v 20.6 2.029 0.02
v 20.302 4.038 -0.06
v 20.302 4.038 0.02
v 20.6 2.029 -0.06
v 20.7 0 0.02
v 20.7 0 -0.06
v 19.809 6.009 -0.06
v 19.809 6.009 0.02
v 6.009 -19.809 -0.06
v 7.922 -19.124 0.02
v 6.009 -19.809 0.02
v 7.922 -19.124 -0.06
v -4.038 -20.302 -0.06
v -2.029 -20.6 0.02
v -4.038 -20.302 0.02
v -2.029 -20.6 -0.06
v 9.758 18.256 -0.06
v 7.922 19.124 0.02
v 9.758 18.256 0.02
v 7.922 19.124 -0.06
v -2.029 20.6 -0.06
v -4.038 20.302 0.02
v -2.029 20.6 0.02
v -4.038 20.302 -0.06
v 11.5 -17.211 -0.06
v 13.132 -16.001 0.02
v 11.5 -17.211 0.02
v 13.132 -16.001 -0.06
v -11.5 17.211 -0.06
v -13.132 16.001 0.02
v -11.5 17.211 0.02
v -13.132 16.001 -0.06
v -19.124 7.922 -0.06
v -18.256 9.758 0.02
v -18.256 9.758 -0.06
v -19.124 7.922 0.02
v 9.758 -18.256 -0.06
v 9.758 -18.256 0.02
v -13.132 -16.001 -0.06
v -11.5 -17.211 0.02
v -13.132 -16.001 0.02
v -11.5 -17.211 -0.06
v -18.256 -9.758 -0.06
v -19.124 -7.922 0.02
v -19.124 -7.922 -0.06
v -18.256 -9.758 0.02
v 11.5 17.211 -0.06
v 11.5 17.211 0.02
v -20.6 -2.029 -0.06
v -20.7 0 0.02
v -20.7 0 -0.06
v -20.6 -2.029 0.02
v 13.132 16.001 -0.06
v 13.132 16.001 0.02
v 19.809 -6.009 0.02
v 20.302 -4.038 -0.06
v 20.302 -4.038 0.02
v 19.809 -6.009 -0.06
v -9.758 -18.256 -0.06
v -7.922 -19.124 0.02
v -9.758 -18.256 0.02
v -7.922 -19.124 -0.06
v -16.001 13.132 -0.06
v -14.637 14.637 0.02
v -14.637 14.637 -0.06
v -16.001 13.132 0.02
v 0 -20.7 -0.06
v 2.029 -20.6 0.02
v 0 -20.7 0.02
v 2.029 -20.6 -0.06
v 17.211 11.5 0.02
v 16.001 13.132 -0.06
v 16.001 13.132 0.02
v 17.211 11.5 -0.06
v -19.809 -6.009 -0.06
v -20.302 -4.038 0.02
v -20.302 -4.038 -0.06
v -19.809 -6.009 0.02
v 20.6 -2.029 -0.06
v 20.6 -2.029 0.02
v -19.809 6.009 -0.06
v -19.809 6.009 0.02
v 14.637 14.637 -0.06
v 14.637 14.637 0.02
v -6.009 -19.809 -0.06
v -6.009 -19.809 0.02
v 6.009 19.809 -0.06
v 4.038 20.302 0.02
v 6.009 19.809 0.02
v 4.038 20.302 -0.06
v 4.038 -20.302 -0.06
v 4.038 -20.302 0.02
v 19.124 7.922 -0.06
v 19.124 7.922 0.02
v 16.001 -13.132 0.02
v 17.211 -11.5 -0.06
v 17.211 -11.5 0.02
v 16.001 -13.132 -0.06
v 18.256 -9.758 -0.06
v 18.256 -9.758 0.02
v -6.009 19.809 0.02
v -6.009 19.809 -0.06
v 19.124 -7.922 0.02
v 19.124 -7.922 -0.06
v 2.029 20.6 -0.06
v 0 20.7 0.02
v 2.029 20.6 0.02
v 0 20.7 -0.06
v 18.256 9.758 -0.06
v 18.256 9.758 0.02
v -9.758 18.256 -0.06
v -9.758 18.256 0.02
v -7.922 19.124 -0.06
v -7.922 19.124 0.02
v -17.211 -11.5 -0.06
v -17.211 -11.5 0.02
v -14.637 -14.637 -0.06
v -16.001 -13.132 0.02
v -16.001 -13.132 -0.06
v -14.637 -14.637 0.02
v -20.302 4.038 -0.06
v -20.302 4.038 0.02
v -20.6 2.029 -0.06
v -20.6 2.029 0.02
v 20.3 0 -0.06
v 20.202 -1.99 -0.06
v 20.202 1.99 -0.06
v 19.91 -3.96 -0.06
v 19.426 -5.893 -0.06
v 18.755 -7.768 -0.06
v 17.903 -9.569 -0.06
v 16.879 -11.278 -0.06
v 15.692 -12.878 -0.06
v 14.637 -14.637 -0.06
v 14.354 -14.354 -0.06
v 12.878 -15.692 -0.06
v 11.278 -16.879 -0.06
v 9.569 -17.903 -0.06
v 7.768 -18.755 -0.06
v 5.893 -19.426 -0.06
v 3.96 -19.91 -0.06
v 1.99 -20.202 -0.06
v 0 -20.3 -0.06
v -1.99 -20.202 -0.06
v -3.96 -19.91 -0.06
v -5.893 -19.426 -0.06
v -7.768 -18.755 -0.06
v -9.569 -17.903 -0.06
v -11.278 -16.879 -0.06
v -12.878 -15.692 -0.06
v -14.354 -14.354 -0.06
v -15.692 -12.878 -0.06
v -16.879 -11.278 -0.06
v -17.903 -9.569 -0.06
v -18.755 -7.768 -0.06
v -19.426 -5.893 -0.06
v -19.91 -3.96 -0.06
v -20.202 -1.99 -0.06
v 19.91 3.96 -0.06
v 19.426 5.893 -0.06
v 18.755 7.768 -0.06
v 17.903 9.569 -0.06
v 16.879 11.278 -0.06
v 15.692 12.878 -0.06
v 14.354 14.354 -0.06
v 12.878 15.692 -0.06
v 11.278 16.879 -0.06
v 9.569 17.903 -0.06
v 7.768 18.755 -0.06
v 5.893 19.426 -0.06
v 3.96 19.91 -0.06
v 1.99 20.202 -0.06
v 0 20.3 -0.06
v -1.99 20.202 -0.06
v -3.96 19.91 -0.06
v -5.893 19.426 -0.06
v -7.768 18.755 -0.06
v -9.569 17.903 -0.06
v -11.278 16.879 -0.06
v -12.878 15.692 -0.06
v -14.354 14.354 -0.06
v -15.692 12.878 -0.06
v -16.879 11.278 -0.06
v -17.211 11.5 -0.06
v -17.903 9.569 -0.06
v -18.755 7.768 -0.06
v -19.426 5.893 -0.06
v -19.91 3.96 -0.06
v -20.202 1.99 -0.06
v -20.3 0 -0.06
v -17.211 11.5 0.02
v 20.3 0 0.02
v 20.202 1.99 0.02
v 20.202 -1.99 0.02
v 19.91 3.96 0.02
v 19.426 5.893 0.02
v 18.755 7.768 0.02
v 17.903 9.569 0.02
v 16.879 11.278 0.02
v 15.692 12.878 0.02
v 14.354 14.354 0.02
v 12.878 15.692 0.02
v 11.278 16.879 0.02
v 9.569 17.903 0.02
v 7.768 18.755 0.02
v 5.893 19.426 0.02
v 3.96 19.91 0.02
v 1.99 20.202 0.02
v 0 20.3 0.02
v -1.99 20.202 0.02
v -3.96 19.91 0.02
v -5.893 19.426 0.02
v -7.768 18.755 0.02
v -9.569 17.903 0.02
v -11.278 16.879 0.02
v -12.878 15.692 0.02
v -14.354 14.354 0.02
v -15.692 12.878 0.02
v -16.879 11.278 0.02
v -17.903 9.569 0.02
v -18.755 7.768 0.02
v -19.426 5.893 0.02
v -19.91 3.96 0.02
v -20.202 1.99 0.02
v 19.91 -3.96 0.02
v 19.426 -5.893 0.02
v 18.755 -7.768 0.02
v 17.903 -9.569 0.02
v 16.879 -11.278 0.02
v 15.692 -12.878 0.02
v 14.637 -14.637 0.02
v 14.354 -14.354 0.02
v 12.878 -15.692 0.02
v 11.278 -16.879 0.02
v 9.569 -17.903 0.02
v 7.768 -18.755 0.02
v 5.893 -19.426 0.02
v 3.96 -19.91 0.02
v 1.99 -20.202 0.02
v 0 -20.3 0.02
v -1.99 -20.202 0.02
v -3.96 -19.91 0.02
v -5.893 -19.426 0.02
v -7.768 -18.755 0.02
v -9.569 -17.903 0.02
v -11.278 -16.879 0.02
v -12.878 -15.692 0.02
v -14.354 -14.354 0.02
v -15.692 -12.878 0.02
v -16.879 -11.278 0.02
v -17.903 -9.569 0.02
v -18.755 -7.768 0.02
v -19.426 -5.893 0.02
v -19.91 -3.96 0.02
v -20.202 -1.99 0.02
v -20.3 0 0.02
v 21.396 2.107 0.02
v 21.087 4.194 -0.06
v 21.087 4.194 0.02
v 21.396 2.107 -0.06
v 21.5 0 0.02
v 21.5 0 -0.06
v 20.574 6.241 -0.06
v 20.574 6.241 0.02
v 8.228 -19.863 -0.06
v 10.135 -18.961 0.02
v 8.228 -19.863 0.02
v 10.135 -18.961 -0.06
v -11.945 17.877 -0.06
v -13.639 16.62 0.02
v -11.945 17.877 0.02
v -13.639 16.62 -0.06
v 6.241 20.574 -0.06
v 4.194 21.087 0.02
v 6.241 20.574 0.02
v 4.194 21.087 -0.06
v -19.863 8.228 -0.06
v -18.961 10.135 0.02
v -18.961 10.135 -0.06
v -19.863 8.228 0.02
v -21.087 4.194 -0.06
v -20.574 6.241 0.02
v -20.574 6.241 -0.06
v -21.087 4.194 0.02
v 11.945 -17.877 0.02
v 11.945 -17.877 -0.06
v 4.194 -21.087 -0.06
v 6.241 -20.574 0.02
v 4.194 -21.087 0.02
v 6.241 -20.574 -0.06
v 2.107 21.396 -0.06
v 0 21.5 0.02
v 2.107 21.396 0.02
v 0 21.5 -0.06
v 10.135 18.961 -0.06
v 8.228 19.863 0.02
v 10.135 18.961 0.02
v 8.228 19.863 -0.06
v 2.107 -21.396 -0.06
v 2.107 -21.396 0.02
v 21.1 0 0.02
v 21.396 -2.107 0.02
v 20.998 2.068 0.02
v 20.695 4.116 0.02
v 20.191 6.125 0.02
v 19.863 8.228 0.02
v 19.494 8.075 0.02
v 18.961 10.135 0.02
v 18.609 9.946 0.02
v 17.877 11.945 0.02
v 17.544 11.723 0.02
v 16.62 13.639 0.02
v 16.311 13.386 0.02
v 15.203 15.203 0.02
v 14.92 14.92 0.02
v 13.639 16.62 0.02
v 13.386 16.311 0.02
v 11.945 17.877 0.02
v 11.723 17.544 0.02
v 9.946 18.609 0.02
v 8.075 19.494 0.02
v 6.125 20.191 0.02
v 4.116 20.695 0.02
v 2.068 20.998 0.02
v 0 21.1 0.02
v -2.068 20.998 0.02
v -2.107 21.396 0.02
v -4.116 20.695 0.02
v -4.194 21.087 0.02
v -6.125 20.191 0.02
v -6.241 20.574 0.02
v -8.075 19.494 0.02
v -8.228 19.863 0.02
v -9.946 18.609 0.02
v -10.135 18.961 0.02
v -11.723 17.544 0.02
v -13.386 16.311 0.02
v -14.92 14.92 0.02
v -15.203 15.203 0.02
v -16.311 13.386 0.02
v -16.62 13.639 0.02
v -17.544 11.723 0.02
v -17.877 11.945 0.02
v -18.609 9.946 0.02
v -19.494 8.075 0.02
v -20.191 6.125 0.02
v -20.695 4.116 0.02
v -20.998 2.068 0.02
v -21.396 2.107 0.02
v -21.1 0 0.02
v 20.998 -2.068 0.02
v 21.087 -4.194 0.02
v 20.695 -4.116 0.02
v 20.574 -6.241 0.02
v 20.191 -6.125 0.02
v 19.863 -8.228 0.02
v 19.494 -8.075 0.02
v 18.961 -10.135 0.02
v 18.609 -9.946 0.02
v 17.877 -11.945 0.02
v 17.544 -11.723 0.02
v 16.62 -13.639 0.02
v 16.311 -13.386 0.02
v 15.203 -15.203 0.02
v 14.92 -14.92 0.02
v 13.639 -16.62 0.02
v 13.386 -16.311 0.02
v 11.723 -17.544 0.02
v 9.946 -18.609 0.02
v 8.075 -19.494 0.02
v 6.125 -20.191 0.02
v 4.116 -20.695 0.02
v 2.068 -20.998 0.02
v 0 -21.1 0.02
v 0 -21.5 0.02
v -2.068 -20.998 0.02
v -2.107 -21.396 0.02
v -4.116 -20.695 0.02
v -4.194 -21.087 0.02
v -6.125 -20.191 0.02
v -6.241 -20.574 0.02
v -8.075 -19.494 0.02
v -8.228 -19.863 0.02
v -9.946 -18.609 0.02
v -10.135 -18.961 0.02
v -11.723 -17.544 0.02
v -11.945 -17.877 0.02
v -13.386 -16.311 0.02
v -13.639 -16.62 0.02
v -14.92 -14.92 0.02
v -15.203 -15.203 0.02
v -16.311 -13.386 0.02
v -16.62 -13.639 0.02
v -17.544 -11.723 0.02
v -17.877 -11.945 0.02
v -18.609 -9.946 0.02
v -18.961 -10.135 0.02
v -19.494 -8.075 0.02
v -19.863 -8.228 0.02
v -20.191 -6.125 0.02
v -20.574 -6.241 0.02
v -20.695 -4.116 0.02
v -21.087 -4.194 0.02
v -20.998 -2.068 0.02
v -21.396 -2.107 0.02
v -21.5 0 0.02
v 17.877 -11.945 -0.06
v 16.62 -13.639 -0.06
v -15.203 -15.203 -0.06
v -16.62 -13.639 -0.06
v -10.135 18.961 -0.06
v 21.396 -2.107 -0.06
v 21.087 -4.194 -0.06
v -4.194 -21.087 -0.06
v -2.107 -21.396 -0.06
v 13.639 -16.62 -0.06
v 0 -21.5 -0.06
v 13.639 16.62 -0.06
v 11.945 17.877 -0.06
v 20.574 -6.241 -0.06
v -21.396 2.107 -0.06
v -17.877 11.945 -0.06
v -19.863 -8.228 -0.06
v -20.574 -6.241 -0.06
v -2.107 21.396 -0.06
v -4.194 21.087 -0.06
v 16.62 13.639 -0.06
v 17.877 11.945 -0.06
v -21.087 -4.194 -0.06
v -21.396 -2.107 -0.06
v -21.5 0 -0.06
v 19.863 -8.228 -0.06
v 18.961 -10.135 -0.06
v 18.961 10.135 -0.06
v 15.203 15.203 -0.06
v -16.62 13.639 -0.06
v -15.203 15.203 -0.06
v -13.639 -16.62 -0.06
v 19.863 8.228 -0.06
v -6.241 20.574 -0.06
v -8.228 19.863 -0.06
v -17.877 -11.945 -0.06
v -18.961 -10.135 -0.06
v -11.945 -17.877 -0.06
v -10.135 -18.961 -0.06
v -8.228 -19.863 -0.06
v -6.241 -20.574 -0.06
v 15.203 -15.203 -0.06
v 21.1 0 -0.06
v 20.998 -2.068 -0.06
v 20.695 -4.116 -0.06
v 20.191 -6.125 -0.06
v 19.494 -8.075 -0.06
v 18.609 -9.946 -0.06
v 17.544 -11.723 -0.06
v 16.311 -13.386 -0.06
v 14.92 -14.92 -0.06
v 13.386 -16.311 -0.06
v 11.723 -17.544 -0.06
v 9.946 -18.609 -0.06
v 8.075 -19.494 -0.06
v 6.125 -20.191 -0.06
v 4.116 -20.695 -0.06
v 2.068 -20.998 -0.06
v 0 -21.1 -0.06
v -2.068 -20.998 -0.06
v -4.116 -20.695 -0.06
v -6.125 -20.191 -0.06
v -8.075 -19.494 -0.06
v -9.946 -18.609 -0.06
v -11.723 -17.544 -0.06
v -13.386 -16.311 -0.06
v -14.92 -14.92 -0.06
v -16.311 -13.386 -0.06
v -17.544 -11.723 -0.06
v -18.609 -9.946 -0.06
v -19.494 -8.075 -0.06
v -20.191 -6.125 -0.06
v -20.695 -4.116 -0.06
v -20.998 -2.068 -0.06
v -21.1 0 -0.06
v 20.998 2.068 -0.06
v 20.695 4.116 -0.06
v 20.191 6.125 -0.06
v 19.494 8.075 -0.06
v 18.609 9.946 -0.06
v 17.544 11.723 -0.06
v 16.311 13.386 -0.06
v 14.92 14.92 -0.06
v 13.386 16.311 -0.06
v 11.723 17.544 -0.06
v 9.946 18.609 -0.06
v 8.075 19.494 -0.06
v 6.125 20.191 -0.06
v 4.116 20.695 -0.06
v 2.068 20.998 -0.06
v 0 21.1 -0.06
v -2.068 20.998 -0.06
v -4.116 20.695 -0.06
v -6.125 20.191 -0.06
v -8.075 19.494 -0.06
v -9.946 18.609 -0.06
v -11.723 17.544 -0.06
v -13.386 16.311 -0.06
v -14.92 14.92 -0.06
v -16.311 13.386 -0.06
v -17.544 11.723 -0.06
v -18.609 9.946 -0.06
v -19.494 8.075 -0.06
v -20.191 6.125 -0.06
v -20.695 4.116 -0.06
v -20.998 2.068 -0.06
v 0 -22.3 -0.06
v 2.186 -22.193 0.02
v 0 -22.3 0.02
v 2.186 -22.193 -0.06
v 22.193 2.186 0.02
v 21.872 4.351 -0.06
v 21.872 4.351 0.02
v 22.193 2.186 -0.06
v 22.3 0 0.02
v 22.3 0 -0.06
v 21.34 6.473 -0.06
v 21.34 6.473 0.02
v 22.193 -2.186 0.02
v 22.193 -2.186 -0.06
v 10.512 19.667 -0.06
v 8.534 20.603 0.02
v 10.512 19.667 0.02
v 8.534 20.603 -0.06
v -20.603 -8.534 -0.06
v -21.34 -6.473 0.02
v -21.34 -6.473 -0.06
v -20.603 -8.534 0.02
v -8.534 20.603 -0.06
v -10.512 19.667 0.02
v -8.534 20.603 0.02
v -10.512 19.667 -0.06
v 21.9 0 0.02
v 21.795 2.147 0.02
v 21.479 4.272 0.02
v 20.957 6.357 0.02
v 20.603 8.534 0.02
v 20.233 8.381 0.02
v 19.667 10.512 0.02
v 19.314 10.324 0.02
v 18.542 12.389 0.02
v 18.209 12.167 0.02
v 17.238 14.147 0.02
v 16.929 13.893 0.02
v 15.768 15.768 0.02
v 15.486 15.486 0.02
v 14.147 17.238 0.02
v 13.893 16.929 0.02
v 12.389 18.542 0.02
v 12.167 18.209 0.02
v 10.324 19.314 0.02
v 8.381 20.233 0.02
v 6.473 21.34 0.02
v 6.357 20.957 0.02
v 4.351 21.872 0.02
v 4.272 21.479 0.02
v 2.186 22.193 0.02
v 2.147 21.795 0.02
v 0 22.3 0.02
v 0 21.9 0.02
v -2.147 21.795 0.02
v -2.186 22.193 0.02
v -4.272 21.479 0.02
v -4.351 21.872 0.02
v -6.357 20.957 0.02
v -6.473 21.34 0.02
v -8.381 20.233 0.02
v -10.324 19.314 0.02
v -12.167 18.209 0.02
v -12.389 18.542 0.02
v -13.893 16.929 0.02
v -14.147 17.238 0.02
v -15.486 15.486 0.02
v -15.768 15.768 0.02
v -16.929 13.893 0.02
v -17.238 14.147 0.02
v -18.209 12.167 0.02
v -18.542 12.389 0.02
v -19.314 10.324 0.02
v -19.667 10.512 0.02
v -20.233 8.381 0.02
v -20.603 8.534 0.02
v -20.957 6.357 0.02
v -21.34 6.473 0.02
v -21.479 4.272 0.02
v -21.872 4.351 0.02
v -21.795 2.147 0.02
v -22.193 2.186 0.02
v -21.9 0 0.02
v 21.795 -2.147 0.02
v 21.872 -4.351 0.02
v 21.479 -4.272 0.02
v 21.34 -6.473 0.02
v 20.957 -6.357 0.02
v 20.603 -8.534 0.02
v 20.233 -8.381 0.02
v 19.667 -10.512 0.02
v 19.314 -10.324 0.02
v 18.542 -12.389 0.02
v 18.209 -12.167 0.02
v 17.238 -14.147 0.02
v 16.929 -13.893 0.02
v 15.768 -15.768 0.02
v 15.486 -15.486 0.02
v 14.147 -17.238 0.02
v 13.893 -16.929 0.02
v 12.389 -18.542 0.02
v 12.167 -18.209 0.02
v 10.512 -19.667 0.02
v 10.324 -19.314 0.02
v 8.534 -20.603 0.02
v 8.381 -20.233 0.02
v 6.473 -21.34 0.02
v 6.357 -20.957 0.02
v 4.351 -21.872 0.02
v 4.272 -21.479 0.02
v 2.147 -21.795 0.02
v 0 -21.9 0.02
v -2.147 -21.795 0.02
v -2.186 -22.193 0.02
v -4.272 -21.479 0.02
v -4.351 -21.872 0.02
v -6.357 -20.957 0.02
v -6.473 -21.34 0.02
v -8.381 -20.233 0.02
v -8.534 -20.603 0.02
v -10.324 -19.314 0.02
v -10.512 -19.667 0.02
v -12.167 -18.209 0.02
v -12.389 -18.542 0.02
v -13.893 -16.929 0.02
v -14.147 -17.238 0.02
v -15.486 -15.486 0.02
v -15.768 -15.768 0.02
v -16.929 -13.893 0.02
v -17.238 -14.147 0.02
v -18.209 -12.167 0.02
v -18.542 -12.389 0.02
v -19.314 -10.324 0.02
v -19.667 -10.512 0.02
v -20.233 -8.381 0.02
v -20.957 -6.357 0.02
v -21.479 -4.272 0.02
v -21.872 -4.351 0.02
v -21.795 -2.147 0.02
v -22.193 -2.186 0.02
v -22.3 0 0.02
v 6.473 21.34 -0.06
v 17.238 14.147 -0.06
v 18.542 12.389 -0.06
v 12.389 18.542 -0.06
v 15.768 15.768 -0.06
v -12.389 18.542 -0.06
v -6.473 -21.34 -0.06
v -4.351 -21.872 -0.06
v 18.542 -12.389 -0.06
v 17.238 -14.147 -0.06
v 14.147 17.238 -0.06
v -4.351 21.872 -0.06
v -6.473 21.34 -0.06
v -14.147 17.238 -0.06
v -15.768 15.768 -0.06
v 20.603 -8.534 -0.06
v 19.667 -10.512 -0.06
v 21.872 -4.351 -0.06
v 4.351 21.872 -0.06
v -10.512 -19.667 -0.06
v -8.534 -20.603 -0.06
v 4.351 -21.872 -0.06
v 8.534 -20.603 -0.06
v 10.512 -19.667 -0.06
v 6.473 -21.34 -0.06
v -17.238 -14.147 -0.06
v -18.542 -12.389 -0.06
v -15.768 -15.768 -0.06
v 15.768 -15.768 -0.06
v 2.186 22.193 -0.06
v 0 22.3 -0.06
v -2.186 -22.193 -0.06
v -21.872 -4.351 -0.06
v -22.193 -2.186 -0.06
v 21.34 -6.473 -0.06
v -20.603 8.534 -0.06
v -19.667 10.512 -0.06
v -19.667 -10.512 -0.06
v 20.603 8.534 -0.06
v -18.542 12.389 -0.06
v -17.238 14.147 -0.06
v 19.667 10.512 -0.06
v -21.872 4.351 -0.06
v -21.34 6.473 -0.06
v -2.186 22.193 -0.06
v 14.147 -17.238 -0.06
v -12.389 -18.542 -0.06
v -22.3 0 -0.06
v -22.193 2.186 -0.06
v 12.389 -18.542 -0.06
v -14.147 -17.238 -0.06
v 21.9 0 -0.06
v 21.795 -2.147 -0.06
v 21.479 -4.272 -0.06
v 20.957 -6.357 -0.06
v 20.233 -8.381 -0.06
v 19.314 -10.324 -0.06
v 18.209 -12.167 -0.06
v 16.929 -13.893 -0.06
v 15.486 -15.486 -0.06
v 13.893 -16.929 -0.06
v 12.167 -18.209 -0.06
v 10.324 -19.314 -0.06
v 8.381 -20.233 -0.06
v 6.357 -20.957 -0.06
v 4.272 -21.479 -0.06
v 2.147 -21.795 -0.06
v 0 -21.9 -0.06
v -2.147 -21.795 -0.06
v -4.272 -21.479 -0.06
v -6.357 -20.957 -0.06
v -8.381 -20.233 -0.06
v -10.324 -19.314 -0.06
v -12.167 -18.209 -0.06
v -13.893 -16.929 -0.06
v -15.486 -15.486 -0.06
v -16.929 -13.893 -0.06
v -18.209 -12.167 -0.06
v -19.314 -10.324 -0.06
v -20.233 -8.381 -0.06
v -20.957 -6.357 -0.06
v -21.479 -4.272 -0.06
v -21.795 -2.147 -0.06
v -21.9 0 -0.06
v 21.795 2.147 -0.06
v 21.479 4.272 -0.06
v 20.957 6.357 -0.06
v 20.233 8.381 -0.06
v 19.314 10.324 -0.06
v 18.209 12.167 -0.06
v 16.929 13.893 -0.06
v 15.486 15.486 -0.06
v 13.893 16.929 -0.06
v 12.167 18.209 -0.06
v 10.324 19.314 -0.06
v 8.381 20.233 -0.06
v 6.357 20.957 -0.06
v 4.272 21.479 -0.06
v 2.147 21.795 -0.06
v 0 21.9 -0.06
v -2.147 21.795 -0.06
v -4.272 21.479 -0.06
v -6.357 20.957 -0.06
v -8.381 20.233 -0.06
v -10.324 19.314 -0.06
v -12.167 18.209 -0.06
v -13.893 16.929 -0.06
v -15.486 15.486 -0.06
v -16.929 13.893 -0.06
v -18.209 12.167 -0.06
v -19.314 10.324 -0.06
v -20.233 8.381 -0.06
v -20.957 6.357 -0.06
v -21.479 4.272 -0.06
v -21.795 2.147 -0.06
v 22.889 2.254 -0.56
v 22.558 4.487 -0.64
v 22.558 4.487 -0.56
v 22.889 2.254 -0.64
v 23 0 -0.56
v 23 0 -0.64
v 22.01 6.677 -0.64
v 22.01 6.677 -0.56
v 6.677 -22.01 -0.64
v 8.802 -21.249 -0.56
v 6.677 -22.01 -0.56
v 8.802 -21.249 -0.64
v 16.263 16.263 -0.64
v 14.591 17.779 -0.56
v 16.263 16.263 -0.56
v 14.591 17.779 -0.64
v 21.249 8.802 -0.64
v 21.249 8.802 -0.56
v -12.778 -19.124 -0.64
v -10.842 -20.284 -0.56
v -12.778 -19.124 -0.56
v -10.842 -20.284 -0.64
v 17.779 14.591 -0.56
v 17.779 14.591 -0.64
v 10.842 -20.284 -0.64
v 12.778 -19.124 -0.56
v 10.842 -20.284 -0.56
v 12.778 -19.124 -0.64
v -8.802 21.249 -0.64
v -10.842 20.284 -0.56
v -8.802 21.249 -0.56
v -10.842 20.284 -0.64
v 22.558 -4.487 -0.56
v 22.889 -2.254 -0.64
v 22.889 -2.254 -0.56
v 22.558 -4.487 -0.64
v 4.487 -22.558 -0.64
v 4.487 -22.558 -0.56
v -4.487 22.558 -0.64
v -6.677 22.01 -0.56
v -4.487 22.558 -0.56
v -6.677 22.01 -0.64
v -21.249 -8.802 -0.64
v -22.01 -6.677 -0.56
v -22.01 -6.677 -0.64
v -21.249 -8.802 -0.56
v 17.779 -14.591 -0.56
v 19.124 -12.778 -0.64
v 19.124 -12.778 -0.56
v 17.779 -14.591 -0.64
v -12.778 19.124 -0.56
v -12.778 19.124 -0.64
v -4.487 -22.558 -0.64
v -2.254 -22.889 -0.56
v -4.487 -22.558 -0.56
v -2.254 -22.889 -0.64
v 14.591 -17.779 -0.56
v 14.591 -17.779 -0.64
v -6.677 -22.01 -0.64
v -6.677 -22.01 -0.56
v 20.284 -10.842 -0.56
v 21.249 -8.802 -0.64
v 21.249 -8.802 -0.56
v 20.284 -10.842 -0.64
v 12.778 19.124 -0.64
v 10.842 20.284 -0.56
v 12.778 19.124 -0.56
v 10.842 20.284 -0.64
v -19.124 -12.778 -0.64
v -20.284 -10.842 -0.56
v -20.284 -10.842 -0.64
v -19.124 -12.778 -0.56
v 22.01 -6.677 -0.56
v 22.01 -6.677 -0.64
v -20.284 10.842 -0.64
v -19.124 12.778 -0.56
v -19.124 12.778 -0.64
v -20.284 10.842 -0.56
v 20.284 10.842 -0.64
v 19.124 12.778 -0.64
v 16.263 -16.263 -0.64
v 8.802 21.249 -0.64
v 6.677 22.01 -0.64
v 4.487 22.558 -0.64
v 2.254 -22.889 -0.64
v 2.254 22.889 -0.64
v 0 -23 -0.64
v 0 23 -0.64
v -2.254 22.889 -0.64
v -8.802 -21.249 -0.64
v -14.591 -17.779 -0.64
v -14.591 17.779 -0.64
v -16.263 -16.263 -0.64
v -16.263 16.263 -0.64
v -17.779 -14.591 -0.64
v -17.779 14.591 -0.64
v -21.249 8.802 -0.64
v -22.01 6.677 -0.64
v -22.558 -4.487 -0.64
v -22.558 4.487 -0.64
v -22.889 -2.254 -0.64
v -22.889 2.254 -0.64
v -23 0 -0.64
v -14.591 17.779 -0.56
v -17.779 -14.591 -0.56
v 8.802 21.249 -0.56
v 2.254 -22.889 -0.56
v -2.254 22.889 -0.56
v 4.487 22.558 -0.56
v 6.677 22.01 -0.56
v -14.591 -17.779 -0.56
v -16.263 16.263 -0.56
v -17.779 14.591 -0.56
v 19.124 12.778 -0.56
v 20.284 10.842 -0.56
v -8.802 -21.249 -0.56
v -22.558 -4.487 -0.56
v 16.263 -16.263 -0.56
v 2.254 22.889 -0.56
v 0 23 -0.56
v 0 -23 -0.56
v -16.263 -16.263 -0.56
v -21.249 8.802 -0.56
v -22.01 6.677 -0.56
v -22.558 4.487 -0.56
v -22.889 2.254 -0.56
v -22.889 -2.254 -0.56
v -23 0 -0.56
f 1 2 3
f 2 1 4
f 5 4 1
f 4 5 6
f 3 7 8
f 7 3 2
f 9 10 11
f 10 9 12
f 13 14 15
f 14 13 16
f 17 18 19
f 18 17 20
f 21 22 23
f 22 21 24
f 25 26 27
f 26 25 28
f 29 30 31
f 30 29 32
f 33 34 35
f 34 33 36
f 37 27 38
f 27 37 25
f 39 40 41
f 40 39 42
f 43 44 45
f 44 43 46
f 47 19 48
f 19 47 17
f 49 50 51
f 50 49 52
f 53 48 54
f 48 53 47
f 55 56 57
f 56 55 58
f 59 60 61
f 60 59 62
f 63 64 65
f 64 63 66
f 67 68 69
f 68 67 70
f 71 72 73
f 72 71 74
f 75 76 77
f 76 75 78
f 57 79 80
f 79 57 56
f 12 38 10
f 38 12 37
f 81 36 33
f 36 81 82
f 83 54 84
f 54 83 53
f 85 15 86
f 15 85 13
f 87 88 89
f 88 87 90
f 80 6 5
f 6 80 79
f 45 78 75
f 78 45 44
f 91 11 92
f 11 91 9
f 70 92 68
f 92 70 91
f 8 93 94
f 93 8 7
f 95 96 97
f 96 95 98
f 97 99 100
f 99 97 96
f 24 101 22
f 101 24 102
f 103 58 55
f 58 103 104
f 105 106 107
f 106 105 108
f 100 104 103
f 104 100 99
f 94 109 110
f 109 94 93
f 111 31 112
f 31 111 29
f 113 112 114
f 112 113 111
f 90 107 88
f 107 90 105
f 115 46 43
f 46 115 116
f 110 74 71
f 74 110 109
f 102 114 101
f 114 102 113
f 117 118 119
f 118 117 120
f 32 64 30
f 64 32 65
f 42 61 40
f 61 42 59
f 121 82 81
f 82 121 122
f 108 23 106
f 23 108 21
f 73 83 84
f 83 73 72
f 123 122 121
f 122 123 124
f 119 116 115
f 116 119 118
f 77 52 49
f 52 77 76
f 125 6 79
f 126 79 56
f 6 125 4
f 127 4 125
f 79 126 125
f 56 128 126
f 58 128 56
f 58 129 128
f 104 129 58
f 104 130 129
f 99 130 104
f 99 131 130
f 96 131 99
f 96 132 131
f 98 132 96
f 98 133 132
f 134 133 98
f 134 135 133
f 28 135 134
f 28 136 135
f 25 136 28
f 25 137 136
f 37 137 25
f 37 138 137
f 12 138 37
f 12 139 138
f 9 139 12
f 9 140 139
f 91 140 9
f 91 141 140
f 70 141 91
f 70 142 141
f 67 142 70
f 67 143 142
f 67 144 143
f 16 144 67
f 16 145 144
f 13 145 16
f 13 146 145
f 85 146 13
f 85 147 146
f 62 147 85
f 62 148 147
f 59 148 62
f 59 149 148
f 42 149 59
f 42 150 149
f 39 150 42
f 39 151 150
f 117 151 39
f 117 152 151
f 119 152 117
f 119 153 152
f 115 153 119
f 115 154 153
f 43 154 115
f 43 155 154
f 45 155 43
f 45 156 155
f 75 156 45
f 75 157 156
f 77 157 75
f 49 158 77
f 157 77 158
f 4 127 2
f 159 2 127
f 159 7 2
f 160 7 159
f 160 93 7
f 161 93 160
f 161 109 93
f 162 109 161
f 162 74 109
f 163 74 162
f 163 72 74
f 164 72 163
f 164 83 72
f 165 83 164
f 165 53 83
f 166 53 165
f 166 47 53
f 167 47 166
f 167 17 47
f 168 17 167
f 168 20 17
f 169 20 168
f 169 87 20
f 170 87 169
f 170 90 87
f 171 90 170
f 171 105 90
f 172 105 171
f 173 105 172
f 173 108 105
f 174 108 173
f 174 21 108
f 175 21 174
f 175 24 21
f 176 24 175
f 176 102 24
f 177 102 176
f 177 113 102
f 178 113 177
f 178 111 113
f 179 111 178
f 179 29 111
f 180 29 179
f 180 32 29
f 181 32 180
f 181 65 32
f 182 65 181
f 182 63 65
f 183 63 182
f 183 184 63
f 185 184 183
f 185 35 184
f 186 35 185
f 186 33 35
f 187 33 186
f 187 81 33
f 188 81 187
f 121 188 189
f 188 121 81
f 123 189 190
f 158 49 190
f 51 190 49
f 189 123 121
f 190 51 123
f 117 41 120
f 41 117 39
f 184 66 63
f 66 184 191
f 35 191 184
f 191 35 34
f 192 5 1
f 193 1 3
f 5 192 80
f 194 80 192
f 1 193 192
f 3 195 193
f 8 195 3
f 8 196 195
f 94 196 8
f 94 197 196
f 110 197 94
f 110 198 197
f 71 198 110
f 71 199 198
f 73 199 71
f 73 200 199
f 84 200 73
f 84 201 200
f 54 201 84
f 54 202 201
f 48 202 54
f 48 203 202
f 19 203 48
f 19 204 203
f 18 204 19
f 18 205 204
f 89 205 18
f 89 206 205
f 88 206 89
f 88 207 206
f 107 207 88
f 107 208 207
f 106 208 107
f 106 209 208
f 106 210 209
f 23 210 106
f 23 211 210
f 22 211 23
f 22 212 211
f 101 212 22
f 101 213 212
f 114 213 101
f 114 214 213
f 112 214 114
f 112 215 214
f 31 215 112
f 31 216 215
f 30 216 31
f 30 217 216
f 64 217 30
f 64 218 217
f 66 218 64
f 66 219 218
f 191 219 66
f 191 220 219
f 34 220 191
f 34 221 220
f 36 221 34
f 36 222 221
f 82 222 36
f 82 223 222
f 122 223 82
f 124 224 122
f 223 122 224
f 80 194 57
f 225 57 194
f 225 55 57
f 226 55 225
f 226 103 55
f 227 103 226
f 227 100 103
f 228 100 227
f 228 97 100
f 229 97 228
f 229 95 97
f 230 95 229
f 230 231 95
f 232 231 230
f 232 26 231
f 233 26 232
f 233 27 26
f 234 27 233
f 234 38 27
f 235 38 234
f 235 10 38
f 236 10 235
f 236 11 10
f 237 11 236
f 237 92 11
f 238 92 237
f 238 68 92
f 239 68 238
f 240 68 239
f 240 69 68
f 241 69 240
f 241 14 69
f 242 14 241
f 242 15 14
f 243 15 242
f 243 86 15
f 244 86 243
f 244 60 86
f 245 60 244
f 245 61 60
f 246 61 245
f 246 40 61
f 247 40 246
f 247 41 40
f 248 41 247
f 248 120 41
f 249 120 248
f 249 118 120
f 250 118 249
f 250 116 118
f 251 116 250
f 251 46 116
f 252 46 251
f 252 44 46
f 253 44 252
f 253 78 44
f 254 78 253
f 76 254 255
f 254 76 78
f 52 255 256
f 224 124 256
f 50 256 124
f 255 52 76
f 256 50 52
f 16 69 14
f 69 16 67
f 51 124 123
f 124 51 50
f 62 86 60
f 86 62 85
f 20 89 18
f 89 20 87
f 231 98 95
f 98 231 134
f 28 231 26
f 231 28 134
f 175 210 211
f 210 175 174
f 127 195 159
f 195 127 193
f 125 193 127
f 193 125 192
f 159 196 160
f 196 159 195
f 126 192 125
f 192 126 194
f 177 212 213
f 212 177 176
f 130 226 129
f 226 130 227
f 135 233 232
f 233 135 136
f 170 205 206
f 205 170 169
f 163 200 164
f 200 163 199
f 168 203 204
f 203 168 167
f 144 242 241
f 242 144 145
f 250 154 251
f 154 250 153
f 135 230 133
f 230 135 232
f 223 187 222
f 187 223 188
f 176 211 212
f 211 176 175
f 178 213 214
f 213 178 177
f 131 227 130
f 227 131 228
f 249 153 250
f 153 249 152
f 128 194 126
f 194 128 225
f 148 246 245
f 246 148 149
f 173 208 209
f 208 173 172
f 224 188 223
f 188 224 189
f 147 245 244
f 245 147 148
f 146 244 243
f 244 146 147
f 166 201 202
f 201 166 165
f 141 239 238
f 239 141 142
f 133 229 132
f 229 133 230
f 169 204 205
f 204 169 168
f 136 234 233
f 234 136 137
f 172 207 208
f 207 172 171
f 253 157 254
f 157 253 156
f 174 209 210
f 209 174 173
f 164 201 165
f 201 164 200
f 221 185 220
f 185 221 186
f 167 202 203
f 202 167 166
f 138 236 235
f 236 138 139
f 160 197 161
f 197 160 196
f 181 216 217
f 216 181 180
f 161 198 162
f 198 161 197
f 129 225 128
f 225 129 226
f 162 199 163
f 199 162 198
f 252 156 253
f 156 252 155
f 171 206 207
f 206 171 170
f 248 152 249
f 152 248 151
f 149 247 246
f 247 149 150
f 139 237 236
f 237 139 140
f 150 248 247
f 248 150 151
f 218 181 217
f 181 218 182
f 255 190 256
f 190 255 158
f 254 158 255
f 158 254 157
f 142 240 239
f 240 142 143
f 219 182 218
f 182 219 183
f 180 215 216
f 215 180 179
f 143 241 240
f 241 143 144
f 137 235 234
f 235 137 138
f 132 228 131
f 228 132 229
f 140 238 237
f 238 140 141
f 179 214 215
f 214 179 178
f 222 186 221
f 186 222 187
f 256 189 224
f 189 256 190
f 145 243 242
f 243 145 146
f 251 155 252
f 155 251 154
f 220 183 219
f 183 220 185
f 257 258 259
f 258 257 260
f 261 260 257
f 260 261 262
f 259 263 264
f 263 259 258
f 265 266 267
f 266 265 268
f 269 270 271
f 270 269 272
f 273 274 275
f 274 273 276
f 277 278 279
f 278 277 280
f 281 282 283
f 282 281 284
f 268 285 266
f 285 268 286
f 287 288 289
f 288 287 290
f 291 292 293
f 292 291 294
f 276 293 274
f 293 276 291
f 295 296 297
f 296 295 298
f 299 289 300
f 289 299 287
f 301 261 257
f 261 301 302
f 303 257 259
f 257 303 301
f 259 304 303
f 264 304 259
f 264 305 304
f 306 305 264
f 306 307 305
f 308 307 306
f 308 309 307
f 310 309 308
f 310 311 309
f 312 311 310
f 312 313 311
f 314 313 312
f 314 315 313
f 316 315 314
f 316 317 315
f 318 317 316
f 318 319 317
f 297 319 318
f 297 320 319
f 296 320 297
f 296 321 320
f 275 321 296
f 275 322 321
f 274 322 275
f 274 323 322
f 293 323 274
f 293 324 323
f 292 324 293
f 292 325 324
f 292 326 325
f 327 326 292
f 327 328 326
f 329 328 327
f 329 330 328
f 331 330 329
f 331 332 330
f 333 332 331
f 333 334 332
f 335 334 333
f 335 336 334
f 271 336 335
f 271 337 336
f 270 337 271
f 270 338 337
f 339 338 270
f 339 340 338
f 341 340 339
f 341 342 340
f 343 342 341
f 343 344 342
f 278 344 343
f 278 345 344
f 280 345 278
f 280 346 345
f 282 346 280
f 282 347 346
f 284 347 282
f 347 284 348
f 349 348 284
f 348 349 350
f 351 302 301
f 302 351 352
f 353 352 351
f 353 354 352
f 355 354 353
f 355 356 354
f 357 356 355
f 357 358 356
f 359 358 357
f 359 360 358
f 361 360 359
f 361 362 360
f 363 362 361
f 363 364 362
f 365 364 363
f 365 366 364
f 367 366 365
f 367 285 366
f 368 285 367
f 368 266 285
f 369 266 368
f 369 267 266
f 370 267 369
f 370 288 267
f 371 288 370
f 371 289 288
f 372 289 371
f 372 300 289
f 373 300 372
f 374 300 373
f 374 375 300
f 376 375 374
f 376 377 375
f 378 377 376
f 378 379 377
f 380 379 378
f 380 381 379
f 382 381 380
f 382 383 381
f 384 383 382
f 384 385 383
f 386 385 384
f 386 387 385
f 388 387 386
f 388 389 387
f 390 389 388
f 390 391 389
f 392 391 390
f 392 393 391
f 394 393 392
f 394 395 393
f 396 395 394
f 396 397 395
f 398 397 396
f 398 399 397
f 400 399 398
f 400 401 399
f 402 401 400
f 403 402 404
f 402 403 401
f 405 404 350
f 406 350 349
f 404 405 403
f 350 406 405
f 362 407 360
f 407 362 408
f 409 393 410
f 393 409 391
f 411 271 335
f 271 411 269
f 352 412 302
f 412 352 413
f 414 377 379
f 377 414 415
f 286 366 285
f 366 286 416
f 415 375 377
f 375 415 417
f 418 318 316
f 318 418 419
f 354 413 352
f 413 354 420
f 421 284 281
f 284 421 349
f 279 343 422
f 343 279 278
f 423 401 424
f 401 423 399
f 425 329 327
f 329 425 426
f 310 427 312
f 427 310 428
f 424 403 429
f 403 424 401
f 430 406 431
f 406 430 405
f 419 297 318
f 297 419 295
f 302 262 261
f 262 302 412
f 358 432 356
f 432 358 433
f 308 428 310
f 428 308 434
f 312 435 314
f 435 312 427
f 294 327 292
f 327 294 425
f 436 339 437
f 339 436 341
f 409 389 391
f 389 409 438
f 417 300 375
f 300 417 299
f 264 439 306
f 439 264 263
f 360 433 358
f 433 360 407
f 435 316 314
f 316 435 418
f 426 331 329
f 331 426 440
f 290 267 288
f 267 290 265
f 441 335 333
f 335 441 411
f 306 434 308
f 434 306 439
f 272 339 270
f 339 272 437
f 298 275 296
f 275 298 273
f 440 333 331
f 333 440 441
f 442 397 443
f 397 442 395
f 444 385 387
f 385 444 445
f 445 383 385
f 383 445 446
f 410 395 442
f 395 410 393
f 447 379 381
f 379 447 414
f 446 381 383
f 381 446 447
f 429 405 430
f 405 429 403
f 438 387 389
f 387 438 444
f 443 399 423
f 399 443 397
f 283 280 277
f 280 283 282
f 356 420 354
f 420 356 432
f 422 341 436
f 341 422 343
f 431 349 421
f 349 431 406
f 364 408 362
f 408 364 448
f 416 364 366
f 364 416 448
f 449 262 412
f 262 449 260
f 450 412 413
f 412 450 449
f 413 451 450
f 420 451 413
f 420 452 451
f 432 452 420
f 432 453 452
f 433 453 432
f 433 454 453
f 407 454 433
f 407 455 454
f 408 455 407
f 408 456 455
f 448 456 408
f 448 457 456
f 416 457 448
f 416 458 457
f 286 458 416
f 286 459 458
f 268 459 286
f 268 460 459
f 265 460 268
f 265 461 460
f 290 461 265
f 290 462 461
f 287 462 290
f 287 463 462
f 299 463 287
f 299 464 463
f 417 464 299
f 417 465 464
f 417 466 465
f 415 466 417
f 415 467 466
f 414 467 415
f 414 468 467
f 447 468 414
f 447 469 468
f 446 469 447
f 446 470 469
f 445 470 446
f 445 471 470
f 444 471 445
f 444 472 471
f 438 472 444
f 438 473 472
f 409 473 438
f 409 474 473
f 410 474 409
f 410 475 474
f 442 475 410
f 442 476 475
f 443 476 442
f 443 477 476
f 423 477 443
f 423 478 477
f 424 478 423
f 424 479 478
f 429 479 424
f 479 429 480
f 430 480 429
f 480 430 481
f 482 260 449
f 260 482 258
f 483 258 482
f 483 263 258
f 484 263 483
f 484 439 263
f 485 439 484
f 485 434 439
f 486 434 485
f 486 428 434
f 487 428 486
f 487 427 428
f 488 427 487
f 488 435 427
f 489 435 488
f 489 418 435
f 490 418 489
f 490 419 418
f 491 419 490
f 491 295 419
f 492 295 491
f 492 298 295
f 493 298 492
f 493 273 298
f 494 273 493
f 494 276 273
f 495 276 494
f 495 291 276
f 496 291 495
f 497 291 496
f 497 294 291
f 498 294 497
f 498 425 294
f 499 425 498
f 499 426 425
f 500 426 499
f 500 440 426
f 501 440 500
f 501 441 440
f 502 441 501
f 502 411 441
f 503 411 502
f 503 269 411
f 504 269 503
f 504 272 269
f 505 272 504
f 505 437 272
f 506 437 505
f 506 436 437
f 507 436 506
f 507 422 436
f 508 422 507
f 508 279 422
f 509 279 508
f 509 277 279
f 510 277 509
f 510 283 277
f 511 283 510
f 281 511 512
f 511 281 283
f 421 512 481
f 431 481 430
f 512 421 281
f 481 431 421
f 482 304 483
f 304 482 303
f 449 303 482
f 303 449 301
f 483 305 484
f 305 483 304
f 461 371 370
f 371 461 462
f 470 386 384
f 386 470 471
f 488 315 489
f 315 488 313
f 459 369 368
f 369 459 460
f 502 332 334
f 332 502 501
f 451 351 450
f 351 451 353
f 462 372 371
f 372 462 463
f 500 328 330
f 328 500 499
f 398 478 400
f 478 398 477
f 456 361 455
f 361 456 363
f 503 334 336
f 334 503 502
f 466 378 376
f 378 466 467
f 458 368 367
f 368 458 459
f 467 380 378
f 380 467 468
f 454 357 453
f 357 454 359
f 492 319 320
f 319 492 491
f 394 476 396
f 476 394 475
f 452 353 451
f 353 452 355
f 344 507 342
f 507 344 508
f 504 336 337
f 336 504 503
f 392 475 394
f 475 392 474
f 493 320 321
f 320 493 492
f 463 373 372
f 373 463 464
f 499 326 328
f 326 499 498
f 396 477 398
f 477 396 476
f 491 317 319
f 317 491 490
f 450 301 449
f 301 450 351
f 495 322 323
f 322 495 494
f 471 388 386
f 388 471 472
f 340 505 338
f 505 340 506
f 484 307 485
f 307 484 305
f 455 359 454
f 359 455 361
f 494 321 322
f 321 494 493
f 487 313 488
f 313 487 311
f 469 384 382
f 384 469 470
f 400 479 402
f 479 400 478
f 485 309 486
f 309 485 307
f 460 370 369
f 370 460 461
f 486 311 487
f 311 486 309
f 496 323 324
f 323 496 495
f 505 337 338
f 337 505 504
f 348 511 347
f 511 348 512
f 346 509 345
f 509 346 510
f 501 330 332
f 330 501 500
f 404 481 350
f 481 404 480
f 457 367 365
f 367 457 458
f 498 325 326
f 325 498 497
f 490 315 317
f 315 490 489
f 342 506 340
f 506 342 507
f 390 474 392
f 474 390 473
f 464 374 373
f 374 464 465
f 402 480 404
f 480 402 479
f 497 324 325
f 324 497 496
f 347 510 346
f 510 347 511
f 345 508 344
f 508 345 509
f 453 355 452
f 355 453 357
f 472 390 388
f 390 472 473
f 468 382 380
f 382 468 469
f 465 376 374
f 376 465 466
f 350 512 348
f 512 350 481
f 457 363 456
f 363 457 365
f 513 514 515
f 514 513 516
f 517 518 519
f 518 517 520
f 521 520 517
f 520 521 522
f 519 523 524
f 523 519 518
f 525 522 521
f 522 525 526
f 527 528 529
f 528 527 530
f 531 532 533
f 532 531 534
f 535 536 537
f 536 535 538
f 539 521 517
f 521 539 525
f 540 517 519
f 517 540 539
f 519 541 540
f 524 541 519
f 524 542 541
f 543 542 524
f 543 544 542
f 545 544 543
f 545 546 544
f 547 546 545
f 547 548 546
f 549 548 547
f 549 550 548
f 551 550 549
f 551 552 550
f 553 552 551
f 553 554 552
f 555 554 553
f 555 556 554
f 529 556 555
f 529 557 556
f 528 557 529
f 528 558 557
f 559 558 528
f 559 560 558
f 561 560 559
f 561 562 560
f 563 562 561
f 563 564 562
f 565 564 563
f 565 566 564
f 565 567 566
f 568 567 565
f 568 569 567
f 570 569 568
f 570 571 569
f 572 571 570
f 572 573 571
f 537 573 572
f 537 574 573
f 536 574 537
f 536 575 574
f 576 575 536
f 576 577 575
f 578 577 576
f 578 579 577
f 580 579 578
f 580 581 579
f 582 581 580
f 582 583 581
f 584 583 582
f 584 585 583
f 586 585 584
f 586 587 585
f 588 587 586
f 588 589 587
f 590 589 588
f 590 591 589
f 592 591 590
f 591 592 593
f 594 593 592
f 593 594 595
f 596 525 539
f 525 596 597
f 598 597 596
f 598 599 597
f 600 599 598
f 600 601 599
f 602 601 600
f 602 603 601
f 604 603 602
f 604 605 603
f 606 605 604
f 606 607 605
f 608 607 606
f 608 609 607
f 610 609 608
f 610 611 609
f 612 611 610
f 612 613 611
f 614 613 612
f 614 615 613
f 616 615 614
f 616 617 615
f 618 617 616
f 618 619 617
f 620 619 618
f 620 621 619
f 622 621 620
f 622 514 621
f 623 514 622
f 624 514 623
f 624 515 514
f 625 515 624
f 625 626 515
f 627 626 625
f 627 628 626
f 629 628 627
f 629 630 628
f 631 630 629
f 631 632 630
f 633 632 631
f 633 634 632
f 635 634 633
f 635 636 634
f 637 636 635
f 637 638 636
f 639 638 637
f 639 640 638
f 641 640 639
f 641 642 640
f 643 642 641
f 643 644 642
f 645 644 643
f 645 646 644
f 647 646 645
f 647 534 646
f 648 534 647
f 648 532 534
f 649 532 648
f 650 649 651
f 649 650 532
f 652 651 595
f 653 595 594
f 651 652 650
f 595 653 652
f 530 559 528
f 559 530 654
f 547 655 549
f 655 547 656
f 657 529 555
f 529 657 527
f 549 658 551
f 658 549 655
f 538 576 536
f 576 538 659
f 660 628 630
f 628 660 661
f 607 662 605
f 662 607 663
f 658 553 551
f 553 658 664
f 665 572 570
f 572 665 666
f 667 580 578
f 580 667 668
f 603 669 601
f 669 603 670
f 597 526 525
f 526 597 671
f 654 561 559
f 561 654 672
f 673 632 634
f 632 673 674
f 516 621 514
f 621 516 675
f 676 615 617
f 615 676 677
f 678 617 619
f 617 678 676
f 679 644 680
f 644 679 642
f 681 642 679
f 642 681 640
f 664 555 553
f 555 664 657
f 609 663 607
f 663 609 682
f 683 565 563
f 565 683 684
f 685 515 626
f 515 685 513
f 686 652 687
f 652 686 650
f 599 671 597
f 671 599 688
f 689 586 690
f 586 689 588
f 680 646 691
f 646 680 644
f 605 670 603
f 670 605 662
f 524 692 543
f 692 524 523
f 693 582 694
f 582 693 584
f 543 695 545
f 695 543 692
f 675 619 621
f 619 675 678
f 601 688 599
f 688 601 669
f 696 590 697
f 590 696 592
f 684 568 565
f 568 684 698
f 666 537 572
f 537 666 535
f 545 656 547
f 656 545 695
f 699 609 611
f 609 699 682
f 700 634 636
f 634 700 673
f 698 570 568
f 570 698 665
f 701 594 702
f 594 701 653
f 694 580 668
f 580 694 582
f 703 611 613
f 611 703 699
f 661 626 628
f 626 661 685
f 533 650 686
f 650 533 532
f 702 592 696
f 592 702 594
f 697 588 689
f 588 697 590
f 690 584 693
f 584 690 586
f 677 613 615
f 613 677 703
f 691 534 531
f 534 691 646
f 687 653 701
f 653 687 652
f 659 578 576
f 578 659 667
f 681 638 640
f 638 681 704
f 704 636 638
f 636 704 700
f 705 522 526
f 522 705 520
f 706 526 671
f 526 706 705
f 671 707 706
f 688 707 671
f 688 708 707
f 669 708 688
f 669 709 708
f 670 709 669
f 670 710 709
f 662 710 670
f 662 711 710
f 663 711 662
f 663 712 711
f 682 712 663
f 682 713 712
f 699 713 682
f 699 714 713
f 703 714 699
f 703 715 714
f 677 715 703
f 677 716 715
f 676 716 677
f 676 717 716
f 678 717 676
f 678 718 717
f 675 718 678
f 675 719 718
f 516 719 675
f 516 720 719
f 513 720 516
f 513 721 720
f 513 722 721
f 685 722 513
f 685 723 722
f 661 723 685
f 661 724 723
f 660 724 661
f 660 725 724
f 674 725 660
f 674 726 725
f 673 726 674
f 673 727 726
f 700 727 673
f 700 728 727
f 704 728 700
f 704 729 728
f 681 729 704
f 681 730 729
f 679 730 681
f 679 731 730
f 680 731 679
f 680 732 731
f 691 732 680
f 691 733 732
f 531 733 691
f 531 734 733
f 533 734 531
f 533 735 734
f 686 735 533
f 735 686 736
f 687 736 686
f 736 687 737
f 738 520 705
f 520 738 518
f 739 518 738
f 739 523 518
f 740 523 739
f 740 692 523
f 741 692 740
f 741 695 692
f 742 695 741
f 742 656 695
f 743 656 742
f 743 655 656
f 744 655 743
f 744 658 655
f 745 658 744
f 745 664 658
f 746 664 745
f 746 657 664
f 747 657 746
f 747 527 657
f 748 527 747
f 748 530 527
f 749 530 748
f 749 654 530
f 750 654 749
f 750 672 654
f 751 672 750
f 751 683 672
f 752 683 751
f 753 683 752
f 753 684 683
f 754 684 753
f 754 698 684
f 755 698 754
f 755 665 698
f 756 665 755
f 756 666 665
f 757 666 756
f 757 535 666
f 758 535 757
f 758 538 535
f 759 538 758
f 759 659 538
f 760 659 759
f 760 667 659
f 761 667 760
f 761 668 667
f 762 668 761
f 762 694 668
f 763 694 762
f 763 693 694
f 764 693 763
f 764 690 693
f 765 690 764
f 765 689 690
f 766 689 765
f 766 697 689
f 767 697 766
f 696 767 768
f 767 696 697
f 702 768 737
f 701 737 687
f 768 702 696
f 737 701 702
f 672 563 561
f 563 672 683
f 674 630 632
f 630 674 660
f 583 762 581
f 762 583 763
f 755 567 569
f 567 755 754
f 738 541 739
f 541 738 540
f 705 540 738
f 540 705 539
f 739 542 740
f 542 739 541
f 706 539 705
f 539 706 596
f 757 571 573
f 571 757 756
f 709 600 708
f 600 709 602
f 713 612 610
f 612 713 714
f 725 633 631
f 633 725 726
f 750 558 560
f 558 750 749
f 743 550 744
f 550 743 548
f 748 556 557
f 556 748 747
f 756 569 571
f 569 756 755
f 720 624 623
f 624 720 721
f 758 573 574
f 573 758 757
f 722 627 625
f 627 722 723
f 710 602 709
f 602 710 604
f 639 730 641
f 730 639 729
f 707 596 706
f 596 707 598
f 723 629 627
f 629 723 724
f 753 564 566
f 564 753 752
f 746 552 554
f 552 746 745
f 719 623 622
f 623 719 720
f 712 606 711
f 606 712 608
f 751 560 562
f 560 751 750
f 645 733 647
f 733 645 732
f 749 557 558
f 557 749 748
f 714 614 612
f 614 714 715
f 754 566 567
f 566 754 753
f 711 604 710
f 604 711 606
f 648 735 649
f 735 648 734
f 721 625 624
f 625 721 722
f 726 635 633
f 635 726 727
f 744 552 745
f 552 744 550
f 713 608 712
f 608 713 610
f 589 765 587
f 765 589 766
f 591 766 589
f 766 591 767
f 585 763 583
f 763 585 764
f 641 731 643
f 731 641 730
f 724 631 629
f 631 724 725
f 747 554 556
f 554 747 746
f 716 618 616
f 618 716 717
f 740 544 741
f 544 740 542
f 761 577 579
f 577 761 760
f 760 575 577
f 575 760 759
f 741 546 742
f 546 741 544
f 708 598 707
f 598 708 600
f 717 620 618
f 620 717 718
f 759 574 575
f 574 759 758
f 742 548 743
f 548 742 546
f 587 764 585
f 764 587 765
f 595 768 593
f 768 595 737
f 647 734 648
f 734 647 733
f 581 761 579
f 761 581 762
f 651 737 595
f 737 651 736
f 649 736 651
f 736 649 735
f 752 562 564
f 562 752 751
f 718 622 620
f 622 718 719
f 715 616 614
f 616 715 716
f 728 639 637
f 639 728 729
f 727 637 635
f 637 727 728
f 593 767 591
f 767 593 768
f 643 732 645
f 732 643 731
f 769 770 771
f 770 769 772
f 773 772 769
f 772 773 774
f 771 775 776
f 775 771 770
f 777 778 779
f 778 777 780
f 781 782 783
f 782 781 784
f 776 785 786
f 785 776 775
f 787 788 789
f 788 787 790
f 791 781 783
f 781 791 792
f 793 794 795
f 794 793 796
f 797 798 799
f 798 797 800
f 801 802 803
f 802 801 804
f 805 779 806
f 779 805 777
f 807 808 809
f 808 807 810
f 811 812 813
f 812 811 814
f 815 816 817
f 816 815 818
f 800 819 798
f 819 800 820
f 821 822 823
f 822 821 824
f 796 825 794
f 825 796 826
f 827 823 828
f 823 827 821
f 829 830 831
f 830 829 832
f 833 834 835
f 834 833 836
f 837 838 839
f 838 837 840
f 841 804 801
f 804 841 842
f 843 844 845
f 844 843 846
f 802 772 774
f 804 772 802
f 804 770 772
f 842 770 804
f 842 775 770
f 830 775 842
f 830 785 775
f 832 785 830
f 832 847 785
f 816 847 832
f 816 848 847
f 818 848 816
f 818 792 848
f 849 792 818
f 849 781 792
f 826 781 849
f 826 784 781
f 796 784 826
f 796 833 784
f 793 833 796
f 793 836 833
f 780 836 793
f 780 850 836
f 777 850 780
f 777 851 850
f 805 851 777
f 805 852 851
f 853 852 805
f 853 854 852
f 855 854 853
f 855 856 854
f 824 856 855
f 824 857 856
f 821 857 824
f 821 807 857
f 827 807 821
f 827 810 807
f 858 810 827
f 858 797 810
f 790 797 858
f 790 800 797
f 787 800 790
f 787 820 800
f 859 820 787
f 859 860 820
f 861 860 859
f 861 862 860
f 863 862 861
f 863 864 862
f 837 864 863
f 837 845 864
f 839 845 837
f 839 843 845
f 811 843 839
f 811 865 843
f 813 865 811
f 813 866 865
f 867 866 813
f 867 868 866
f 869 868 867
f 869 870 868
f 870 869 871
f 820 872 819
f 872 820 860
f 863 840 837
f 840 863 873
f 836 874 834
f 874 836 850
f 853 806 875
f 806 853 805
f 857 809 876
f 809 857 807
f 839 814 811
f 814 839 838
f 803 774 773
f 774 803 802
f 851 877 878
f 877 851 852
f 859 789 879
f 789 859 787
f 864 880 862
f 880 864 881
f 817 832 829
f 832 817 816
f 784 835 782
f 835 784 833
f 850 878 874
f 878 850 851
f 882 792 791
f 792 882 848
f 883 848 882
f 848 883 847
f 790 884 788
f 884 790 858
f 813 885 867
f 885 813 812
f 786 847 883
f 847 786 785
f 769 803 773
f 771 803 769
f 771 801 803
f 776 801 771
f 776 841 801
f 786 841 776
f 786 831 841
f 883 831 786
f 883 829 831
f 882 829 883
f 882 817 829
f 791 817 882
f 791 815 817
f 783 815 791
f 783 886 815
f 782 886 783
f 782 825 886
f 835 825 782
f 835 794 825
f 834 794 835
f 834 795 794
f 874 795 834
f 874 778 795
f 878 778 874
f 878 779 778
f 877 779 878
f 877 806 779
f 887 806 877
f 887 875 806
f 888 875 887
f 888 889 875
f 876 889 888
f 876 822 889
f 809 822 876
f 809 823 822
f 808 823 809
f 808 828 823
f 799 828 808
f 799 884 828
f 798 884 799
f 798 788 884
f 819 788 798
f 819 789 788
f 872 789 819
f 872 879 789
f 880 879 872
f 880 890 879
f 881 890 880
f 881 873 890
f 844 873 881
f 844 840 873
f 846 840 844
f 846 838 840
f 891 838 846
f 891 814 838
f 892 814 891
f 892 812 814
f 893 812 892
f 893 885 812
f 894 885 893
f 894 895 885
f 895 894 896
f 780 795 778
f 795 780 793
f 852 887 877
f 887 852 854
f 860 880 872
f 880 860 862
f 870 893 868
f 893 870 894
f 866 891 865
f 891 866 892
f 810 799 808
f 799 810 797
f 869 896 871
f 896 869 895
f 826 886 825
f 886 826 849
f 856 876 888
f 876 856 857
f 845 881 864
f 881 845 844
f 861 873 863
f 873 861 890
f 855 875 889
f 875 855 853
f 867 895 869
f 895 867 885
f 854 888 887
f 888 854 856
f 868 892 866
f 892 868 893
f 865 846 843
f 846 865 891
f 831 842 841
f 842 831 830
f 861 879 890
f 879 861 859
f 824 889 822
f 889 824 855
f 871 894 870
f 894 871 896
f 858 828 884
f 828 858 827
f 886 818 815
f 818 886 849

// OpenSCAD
// ============================================================================
// Atom Lithography Machine — Parametric OpenSCAD Module (S3.1-02)
// ============================================================================
// part_id           : S3.1-02
// parent_bom_id     : S3.1
// subsystem         : S3
// part_name         : Koruma halkasi (guard-ring) ve arka-yuzey ohmik metalizasyon + tel-bag
// material          : Au
// temp_stage        : 20 mK - 300 K
// vacuum_grade      : UHV 1e-9 mbar
// tolerance         : <1 Ohm kontak
// computed_mass_kg  : 0.00299
// envelope_mm       : 52.459 x 52.459 x 0.720
// design_maturity   : M0_M1_DETAILED_CAD_DESIGN_ONLY
// no_lab_measurement: true
// iec61508_certified: false
// semi_s2_certified : false
// Units: millimeters (mm)
// ============================================================================

$fn = 64;

// Nominal bounding envelope parameters (mm)
bbox_x = 52.4588;
bbox_y = 52.4588;
bbox_z = 0.7200;

// Part-specific parametric dimensions
n_guard_rings = 3;
n_wirebond_tabs = 16;
ohmic_od_mm = 46.0;

// Interface / port parameters (mm)
port_wirebond_pad_ring_od = 56.800;
port_wirebond_pad_ring_bore = 50.600;
port_rear_ohmic_bias_od = 46.000;

module part_S3_1_02() {
  union() {
    // Inner Al/Ti/Au guard ring #1
    translate([0.000, 0.000, -0.020]) {
      difference() {
        cylinder(d=41.400, h=0.080, center=true);
        cylinder(d=40.600, h=2.080, center=true);
      }
    }
    // Middle Al/Ti/Au guard ring #2
    translate([0.000, 0.000, -0.020]) {
      difference() {
        cylinder(d=43.000, h=0.080, center=true);
        cylinder(d=42.200, h=2.080, center=true);
      }
    }
    // Outer Al/Ti/Au guard ring #3
    translate([0.000, 0.000, -0.020]) {
      difference() {
        cylinder(d=44.600, h=0.080, center=true);
        cylinder(d=43.800, h=2.080, center=true);
      }
    }
    // Rear ohmic bias metallization
    translate([0.000, 0.000, -0.600]) cylinder(d=46.000, h=0.080, center=true);
  }
}

// World assembly mounting transform (global machine frame, mm / deg):
// translate([0.000, 0.000, 0.000]) rotate([0.000, 0.000, 0.000]) part_S3_1_02();

part_S3_1_02();
